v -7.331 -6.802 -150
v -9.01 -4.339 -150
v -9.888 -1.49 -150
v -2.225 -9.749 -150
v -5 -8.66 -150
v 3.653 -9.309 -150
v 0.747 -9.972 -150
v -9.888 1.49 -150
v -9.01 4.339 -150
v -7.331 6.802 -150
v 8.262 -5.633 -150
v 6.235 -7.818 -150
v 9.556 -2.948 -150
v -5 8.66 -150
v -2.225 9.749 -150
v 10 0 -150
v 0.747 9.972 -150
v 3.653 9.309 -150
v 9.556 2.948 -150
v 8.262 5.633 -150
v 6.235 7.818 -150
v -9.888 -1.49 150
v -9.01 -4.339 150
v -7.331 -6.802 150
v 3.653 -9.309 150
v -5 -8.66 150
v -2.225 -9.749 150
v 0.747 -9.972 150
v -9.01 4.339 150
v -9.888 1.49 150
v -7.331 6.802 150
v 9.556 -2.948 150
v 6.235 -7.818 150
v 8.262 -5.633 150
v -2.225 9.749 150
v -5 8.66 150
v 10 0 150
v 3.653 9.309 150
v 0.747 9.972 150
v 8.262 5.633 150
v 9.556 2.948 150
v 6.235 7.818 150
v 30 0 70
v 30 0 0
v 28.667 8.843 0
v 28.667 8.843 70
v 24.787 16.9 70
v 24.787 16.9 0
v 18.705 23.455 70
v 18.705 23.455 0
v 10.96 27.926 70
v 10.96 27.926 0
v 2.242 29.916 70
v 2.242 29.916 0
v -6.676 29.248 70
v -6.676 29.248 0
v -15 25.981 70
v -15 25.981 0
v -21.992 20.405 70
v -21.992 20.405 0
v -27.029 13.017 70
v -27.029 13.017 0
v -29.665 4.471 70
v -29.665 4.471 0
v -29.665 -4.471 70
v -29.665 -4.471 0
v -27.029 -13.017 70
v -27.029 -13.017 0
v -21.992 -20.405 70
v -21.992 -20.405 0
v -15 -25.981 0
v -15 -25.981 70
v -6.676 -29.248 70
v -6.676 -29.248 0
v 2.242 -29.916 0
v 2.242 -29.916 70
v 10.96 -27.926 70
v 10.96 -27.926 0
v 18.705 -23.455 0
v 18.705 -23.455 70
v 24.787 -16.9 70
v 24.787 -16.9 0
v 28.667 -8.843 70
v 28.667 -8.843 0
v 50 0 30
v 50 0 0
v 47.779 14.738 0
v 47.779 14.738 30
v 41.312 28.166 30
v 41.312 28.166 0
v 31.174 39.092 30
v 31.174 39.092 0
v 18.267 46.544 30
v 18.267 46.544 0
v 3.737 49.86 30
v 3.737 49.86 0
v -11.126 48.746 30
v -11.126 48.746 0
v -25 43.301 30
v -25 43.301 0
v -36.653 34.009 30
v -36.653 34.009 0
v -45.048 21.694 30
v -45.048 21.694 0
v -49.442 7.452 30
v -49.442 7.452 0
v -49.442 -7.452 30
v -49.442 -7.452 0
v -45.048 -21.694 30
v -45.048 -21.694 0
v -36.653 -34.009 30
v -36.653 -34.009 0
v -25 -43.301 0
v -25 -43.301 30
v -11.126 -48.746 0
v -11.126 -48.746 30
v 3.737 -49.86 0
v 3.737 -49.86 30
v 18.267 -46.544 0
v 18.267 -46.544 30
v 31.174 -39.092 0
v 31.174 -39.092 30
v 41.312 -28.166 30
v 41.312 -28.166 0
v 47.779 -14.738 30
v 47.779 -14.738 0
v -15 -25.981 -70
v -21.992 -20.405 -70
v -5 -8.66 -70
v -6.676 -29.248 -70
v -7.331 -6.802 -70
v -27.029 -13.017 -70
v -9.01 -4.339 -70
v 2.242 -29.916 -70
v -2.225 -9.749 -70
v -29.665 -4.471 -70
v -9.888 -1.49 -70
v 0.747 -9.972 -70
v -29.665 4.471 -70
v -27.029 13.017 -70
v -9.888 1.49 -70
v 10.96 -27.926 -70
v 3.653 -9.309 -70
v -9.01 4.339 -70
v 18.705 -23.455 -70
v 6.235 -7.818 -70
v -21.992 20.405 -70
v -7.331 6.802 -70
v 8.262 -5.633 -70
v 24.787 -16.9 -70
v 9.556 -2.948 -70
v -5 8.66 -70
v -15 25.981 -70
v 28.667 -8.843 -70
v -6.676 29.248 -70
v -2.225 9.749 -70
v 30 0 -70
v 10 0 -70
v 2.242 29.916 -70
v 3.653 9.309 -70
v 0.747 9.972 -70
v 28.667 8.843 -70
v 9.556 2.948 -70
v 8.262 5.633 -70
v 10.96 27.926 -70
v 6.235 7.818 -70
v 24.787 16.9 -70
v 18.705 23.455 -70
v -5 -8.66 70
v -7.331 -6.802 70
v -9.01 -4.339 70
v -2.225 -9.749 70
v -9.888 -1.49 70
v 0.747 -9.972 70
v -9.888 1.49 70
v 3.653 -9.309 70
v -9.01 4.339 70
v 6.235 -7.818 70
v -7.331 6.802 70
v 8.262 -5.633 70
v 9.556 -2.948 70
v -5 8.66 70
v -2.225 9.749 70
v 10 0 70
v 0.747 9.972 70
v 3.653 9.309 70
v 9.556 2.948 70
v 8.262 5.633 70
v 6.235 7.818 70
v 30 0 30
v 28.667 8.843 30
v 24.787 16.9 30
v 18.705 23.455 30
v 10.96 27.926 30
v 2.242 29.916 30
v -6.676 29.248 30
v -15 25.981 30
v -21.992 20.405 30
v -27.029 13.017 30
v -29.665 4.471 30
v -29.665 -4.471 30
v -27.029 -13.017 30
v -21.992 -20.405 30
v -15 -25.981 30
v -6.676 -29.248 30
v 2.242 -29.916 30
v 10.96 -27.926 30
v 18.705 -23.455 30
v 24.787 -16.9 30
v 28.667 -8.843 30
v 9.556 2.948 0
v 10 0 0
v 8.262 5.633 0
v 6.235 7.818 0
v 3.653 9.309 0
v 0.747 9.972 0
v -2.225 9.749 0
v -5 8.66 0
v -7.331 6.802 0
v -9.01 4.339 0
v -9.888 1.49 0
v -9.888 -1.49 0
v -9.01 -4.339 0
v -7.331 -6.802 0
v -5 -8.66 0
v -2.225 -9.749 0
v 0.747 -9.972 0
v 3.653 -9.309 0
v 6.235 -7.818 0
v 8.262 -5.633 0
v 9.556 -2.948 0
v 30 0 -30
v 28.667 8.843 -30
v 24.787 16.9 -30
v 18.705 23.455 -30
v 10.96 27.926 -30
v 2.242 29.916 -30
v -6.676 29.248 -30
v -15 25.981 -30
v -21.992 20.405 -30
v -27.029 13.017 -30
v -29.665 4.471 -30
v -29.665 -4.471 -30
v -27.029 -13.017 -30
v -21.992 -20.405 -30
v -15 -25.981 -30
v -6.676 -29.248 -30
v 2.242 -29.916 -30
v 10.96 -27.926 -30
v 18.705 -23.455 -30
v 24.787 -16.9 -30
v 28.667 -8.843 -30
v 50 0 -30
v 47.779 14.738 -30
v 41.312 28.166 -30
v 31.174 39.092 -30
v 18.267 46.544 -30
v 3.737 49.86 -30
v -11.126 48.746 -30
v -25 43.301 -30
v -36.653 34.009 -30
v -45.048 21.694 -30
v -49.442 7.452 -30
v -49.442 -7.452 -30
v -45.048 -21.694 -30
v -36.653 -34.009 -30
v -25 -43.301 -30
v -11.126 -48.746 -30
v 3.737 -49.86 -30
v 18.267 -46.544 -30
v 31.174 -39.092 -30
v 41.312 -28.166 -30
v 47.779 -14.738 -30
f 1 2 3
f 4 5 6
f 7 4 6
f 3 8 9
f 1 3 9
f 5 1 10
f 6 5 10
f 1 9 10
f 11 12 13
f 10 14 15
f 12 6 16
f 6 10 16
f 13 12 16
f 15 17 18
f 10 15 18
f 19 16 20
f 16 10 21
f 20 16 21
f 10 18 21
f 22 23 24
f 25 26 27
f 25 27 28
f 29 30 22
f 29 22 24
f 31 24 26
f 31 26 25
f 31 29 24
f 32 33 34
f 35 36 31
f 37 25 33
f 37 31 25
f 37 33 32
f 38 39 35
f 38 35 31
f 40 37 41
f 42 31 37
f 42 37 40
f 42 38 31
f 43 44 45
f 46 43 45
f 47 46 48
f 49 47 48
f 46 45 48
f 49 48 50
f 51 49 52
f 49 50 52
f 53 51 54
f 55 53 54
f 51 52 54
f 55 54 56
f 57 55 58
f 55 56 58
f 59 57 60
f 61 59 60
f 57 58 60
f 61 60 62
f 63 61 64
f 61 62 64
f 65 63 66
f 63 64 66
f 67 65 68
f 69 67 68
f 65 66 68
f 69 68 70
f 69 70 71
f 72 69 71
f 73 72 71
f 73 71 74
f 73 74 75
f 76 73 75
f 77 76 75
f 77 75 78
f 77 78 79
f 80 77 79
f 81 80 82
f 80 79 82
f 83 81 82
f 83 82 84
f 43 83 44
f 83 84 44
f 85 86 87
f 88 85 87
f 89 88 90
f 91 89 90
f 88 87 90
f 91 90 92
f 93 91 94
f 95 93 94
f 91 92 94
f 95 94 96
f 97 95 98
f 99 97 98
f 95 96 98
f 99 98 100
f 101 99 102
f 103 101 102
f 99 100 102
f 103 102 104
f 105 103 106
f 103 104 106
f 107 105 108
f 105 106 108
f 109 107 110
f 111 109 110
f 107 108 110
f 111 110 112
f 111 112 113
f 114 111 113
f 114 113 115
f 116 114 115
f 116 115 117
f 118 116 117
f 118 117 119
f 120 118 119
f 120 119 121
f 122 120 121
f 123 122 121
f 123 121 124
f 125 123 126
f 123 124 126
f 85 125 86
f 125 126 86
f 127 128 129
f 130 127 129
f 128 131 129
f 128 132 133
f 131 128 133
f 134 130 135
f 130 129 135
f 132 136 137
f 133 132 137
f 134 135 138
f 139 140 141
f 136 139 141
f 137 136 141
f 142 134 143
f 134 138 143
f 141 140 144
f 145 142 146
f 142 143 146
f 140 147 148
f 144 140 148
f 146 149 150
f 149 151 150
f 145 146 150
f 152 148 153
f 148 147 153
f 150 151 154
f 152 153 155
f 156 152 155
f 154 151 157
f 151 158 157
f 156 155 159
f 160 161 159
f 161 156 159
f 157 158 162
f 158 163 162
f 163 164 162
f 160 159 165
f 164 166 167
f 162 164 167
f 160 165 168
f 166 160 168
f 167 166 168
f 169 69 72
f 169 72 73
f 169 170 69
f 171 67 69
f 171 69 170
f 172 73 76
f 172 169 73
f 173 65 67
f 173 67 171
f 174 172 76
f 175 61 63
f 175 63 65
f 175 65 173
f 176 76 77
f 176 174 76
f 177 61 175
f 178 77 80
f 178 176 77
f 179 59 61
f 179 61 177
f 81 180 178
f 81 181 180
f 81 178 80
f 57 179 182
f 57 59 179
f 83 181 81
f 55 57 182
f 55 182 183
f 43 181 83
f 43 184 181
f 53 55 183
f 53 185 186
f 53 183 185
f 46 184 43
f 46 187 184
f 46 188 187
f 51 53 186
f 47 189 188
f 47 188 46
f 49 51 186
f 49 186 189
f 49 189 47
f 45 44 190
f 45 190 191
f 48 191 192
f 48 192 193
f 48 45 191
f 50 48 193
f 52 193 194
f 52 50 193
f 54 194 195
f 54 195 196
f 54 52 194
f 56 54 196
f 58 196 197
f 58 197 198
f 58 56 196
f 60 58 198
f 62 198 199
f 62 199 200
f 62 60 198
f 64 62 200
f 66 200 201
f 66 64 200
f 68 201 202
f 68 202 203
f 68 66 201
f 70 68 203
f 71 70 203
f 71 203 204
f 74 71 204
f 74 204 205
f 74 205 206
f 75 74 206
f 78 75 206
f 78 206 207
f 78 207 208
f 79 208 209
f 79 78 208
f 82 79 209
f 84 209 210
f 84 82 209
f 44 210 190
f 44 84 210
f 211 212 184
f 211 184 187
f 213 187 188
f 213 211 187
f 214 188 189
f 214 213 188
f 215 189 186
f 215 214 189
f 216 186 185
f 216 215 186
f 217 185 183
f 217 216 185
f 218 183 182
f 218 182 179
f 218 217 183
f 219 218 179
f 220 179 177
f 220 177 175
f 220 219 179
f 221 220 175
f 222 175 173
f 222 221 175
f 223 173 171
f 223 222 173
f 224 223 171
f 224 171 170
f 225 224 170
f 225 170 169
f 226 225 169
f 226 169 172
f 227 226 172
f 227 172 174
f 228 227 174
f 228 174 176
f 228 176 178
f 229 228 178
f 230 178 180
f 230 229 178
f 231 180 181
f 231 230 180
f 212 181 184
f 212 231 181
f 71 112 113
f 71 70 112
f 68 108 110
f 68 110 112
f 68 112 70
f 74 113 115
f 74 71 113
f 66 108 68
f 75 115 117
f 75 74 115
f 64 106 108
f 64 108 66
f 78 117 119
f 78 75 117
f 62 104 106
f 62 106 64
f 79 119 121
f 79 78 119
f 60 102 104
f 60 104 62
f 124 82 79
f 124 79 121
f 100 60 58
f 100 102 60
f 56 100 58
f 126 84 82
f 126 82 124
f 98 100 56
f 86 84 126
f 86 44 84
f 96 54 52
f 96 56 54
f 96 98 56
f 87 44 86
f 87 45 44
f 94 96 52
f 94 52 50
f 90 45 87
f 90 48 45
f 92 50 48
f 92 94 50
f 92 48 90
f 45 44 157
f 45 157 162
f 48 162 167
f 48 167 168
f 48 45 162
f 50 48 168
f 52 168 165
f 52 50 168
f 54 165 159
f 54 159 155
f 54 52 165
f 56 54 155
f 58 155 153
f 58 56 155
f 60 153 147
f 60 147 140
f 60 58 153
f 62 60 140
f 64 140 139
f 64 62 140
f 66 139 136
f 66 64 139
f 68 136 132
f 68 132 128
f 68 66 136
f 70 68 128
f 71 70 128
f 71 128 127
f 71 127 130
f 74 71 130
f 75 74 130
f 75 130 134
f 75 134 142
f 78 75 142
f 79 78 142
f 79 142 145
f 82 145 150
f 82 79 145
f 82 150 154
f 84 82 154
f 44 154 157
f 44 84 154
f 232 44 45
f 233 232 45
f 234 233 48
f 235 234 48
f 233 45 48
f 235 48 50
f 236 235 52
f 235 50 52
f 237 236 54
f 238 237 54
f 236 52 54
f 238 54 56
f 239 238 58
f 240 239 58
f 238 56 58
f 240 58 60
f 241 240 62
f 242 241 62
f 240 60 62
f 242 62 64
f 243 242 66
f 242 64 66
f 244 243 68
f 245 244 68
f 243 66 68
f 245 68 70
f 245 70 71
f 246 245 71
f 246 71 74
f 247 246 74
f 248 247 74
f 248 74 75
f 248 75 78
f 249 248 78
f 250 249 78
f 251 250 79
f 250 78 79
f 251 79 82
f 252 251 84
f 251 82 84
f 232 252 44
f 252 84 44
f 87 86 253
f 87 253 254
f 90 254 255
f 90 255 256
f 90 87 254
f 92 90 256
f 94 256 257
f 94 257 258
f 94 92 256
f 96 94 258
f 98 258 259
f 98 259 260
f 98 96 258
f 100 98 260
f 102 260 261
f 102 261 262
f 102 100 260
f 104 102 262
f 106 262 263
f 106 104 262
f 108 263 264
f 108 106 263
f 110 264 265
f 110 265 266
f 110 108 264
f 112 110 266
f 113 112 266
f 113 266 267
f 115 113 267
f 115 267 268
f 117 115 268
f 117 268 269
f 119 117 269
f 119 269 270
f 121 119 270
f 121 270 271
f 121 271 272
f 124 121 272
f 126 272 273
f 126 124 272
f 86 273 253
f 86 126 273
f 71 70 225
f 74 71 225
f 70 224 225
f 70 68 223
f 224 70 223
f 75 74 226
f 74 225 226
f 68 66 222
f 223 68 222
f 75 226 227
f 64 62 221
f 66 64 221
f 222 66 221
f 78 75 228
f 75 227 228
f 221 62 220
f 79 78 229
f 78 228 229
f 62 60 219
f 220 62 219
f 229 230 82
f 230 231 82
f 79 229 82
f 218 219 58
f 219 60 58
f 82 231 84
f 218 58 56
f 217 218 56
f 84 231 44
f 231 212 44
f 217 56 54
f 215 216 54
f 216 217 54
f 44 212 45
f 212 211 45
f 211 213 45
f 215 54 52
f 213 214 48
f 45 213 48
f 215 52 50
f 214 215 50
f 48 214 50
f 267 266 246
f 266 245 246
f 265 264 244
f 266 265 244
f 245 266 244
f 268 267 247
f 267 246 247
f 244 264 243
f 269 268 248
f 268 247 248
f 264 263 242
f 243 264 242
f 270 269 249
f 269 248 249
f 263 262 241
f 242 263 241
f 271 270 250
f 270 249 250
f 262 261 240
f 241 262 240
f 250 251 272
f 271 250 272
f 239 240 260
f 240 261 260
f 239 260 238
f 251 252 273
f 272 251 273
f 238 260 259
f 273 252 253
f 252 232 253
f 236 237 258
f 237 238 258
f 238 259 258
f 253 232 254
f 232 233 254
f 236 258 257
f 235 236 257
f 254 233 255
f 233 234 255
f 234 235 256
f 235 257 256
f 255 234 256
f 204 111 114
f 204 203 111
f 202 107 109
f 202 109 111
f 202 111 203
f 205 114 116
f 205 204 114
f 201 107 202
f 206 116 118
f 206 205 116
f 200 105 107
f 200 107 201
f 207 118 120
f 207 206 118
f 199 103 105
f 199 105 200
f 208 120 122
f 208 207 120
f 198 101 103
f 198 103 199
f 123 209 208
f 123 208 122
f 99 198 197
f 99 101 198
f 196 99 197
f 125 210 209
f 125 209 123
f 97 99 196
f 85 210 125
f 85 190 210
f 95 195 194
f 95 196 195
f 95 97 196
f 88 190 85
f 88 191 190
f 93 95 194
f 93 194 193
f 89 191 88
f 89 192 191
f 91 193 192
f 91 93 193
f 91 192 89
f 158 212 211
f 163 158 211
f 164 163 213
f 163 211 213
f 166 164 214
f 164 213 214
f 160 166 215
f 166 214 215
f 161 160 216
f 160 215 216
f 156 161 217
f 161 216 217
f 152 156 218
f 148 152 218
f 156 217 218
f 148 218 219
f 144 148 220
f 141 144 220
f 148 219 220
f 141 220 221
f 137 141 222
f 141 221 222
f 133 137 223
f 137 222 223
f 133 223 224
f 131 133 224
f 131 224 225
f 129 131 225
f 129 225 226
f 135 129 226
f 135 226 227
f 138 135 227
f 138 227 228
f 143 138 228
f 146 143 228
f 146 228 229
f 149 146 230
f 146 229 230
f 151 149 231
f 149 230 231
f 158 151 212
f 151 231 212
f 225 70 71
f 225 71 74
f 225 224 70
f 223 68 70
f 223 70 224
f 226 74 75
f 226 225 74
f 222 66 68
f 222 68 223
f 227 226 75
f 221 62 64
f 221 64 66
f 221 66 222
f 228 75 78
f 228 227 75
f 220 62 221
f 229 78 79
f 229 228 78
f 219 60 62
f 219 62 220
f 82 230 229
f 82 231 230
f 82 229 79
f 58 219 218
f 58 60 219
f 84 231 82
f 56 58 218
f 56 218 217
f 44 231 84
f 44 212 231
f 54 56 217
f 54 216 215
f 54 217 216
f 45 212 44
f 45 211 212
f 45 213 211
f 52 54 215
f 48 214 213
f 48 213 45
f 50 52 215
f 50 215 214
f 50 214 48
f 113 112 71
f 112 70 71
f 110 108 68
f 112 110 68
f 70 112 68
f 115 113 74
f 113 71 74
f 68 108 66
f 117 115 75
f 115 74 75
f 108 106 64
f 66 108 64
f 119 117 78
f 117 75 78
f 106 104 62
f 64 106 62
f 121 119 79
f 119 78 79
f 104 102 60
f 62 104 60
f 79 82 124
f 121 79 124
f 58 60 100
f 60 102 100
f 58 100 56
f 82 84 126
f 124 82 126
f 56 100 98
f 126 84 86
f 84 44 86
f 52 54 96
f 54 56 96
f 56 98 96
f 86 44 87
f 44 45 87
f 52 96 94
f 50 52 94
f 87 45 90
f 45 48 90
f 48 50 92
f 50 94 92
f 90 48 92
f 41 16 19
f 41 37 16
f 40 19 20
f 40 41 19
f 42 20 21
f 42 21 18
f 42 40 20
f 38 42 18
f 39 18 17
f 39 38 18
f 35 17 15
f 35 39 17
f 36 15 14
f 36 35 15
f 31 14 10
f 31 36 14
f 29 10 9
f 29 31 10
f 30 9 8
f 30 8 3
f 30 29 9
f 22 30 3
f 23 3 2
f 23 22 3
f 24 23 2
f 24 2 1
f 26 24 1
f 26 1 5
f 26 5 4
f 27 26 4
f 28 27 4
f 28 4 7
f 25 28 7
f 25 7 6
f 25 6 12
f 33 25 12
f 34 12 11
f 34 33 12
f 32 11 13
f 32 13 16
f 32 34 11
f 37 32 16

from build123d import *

# Parameters (mm, degrees)
F0_R     = 10
F1_DEPTH = 150
F0_R_2   = 50
F0_R_3   = 30
F2_DEPTH = 30
F3_DEPTH = 70
F4_DEPTH = 150
F5_DEPTH = 70
F6_DEPTH = 30


with BuildPart() as f1:
    # F0 (on Top) → F1 (new body)
    with BuildSketch(Plane.XY):
        Circle(F0_R)
    extrude(amount=F1_DEPTH)

    # F0 (on Top) → F4 (join)
    with BuildSketch(Plane.XY):
        Circle(F0_R)
    extrude(amount=-F4_DEPTH)


with BuildPart() as f2:
    # F0 (on Top) → F2 (new body)
    with BuildSketch(Plane.XY):
        Circle(F0_R_2)
        Circle(F0_R_3, mode=Mode.SUBTRACT)
    extrude(amount=F2_DEPTH)


with BuildPart() as f3:
    # F0 (on Top) → F3 (new body)
    with BuildSketch(Plane.XY):
        Circle(F0_R_3)
        Circle(F0_R, mode=Mode.SUBTRACT)
    extrude(amount=F3_DEPTH)


with BuildPart() as f5:
    # F0 (on Top) → F5 (new body)
    with BuildSketch(Plane.XY):
        Circle(F0_R_3)
        Circle(F0_R, mode=Mode.SUBTRACT)
    extrude(amount=-F5_DEPTH)


with BuildPart() as f6:
    # F0 (on Top) → F6 (new body)
    with BuildSketch(Plane.XY):
        Circle(F0_R_2)
        Circle(F0_R_3, mode=Mode.SUBTRACT)
    extrude(amount=-F6_DEPTH)


solid = Compound([f1.part, f2.part, f3.part, f5.part, f6.part])
